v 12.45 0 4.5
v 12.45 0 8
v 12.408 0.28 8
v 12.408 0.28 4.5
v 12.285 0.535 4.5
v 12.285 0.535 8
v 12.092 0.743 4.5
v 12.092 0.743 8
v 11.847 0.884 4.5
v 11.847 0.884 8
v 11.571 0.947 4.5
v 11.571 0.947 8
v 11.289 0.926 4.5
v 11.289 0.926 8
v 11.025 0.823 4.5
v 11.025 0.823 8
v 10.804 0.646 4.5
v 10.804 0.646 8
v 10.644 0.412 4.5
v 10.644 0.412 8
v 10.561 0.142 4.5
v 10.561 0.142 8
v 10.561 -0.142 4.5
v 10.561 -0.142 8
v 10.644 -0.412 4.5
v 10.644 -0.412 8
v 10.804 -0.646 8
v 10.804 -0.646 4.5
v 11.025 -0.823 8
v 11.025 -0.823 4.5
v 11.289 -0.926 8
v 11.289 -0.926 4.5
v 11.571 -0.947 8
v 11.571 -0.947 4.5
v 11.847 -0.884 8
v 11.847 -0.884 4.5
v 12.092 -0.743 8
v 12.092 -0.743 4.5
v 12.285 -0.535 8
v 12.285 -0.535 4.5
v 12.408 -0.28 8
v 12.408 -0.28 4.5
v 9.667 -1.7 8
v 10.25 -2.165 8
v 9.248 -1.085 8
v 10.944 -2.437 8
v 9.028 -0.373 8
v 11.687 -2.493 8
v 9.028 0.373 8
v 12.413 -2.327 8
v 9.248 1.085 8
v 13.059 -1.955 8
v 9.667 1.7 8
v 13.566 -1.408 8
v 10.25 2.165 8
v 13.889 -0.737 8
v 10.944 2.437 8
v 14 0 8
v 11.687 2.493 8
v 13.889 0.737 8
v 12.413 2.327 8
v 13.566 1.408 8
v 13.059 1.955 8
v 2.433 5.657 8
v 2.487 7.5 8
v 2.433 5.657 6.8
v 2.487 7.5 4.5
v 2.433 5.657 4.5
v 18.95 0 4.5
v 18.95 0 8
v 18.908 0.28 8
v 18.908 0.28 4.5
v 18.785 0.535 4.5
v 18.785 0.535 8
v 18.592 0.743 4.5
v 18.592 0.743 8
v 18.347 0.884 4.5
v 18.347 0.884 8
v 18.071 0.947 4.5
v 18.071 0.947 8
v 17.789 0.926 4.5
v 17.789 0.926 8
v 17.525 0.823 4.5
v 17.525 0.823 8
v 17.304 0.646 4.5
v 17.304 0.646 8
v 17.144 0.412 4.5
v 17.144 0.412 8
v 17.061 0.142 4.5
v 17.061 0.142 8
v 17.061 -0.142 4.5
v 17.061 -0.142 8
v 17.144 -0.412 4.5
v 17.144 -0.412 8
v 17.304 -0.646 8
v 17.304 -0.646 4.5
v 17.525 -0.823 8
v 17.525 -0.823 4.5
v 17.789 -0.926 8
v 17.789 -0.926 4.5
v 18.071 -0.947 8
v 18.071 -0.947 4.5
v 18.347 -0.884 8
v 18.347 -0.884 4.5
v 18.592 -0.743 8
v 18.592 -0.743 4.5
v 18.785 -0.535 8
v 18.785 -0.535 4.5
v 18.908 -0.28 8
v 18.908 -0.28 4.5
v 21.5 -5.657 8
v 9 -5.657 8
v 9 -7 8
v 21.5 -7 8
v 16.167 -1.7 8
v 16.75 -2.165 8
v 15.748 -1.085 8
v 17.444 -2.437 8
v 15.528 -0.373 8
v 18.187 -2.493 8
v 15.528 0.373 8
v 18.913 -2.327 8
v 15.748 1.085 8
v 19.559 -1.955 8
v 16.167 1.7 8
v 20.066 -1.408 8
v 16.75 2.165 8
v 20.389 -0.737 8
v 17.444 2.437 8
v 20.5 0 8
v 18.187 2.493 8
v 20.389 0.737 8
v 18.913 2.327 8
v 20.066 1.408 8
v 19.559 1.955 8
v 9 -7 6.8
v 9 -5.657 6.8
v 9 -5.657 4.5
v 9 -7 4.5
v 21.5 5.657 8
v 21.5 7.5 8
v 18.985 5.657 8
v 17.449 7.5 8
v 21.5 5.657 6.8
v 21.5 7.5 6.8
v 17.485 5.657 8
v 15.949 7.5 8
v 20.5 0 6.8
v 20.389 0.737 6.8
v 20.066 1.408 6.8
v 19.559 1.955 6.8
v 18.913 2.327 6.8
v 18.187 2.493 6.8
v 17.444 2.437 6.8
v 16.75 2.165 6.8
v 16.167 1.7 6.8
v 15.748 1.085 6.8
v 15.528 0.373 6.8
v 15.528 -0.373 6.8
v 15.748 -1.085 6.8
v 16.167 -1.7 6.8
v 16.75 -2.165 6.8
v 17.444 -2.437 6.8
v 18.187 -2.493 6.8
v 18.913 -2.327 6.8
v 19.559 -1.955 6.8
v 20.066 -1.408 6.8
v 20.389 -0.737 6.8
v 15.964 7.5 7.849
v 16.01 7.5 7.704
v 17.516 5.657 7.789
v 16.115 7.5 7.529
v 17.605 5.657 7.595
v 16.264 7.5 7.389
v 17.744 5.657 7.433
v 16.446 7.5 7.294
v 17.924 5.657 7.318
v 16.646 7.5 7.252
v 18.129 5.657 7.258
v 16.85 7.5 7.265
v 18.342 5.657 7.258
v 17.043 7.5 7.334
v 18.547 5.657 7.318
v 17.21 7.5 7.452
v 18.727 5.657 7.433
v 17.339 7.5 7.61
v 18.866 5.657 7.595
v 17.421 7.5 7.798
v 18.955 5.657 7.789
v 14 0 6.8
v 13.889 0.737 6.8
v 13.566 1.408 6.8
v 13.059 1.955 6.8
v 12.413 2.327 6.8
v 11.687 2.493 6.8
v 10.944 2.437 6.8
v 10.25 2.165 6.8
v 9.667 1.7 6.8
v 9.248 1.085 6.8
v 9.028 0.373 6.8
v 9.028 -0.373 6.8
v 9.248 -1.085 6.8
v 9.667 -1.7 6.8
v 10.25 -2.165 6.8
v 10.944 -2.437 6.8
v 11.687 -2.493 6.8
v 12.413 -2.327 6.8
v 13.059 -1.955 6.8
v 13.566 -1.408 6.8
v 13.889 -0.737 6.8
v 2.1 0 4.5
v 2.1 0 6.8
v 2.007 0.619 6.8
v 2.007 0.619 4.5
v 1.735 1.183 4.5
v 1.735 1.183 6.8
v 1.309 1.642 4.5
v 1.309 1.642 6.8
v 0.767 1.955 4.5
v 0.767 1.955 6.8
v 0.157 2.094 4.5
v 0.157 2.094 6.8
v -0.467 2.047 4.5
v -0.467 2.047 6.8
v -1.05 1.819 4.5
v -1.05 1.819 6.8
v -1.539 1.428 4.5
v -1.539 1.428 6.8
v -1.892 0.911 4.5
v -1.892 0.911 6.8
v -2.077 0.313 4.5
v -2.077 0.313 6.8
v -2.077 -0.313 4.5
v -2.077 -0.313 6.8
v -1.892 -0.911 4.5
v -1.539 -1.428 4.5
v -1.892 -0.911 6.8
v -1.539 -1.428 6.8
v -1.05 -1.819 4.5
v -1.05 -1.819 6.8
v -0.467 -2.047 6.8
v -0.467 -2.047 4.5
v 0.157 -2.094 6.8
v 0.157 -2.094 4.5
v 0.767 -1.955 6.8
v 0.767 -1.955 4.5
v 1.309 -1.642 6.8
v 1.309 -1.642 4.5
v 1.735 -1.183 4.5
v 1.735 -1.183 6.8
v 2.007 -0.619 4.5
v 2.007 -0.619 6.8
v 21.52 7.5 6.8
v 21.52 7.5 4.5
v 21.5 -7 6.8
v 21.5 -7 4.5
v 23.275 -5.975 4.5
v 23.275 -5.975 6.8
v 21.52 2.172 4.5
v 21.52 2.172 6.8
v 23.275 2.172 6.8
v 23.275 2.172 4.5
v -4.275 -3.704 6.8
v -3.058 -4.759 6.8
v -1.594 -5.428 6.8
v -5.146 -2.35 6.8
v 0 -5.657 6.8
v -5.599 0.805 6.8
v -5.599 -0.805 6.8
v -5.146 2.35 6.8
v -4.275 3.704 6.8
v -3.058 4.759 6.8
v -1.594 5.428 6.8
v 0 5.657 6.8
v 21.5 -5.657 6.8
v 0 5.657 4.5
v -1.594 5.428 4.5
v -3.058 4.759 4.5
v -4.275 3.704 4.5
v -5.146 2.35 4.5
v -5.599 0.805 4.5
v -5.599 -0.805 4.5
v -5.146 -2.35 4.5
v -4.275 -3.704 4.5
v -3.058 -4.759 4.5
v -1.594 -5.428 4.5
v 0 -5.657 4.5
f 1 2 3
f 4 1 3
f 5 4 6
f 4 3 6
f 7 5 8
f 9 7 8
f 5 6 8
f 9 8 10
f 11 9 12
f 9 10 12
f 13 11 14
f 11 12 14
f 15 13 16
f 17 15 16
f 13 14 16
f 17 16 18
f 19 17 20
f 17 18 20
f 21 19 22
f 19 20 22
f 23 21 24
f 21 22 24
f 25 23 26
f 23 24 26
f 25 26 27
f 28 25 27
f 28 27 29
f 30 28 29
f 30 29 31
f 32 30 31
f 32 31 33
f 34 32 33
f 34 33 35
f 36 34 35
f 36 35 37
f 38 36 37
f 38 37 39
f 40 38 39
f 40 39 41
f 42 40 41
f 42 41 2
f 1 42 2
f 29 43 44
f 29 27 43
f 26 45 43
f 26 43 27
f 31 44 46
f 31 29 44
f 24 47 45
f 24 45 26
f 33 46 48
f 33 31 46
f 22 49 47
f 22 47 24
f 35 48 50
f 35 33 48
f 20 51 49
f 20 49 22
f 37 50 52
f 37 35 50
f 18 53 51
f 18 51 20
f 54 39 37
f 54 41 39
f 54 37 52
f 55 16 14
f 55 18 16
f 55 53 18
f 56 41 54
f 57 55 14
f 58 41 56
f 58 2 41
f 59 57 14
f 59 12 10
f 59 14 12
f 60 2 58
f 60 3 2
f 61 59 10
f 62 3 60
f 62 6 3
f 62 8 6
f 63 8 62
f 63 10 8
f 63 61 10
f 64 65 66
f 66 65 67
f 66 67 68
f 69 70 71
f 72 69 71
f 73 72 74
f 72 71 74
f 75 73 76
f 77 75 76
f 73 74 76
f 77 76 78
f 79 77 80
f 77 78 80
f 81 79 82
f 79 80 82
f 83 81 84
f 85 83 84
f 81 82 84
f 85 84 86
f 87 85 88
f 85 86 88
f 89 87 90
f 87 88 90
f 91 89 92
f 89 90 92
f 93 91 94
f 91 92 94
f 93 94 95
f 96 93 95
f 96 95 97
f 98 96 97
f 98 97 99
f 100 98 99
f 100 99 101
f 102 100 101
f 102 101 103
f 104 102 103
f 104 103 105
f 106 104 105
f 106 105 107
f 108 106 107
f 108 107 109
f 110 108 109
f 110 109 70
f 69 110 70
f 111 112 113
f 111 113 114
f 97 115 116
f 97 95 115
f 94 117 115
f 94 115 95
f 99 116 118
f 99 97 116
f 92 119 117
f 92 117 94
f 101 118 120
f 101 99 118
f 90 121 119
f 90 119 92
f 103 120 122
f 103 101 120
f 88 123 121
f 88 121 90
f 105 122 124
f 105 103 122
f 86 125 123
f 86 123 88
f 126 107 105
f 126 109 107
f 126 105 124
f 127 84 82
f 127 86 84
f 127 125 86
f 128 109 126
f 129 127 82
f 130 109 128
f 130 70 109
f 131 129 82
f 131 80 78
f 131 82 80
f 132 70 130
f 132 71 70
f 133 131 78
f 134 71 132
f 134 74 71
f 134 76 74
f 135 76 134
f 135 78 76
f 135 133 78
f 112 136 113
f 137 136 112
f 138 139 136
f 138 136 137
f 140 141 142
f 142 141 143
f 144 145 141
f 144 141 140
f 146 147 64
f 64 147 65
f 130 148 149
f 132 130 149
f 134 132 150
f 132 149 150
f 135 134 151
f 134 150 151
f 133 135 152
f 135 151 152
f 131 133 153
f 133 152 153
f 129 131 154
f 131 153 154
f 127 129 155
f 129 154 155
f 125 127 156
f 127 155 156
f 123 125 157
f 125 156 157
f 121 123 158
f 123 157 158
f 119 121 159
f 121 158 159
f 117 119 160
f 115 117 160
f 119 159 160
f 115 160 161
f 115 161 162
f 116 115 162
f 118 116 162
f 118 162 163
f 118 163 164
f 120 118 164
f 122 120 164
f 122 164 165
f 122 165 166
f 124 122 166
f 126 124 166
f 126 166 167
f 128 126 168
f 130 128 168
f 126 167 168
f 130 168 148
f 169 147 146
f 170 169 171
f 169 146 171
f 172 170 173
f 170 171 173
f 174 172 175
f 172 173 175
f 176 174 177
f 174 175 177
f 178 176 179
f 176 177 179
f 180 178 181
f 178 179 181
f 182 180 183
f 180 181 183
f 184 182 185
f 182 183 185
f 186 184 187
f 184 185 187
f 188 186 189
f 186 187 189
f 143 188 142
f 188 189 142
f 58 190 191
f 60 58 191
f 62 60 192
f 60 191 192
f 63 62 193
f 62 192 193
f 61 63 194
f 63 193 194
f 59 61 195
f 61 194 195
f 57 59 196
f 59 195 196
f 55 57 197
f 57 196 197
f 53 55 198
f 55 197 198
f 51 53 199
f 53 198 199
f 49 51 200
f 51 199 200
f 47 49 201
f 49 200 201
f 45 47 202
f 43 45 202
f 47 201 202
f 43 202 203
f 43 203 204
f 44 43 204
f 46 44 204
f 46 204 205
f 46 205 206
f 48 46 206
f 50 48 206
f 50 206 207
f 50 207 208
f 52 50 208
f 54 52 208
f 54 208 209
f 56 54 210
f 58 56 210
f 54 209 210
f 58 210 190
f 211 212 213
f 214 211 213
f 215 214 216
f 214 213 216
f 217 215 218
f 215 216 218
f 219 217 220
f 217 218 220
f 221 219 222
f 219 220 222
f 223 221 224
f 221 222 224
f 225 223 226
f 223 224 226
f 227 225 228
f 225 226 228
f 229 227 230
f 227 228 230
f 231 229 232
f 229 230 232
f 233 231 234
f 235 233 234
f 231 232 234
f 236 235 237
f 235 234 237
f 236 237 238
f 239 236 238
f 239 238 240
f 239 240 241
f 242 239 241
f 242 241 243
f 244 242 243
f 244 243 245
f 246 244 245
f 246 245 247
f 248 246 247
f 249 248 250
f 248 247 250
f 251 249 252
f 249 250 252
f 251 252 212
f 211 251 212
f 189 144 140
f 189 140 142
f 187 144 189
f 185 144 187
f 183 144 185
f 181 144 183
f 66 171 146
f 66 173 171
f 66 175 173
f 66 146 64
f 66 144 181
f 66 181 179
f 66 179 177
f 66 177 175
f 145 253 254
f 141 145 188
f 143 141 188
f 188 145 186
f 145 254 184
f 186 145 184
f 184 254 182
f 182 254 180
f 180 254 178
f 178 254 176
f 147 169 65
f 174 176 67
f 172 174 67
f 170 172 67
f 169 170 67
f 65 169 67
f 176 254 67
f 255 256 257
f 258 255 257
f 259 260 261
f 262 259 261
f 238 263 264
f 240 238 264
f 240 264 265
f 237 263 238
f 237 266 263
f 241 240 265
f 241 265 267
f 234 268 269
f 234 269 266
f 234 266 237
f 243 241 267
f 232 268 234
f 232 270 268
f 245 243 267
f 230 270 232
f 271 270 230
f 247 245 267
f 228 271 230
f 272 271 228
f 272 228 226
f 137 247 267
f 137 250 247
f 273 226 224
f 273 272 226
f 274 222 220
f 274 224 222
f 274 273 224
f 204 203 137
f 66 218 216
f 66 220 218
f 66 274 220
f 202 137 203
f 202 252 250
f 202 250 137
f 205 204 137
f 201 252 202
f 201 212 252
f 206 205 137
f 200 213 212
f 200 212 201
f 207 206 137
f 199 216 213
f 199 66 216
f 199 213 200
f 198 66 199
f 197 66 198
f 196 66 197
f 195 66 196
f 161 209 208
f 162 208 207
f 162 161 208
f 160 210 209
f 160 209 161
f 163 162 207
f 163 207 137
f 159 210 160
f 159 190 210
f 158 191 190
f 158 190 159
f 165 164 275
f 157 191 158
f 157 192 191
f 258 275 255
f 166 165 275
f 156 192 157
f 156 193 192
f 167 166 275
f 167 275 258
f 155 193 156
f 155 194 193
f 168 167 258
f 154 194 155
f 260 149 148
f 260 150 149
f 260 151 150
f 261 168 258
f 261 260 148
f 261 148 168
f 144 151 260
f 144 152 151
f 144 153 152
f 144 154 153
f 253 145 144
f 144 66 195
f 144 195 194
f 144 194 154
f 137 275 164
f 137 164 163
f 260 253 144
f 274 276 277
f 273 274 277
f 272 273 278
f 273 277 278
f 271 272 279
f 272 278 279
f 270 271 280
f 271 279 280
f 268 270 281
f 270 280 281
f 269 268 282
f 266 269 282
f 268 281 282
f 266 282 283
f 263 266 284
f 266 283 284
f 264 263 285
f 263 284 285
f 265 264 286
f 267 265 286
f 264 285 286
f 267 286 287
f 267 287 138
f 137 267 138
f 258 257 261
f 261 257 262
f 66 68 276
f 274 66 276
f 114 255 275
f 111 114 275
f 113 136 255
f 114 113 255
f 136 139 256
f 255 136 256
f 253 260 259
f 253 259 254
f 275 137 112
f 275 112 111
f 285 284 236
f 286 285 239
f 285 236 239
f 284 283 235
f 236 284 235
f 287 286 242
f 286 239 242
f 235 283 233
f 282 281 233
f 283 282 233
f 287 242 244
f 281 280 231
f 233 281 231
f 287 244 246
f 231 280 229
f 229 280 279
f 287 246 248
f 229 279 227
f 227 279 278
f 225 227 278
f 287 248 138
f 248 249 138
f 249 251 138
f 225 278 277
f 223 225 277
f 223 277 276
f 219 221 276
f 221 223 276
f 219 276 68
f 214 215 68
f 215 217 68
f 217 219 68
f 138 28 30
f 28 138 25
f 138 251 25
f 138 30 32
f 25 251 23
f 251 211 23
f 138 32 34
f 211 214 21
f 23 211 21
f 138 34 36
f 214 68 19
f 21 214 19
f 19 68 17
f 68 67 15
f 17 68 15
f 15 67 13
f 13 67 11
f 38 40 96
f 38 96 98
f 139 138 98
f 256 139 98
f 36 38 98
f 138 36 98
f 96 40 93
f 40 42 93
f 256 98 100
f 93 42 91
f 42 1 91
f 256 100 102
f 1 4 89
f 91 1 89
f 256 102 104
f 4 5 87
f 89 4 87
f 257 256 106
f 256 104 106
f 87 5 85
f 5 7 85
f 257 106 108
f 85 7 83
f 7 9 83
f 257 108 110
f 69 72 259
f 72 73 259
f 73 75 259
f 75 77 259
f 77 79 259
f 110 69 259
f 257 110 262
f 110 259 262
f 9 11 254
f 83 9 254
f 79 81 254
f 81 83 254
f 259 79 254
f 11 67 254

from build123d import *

# Parameters (mm, degrees)
BOSS_EXTRUDE1_DEPTH  = 2
BOSS_EXTRUDE6_DEPTH  = 2.5
CUT_EXTRUDE6_DEPTH   = 2.5
BOSS_EXTRUDE14_DEPTH = 2.3
SKETCH32_R           = 2.1
CUT_EXTRUDE7_DEPTH   = 2.3
SKETCH33_W           = 12.5
SKETCH33_H           = 1.343145751
BOSS_EXTRUDE15_DEPTH = 1.2
SKETCH35_W           = 5.479645997
SKETCH35_H           = 5.327993755
CUT_EXTRUDE8_DEPTH   = 2.4
SKETCH36_W           = 3.7
SKETCH36_H           = 1.827993755
CUT_EXTRUDE9_DEPTH   = 2.4
SKETCH37_R           = 3.9
BOSS_EXTRUDE16_DEPTH = 2.3
CUT_EXTRUDE10_DEPTH  = 5.3
SKETCH43_R           = 2.5
BOSS_EXTRUDE17_DEPTH = 1.2
SKETCH44_R           = 0.95
CUT_EXTRUDE11_DEPTH  = 9
SKETCH45_R           = 2
CUT_EXTRUDE12_DEPTH  = 2.5
SKETCH52_R           = 0.75
CUT_EXTRUDE13_DEPTH  = 10


with BuildPart() as part:
    # Sketch3 → Boss-Extrude1 (new body)
    with BuildSketch(Plane.XY):
        with BuildLine():
            Line((8, 0), (9, -2.5))
            Line((9, -2.5), (9, -7))
            Line((9, -7), (21.5, -7))
            Line((21.5, -7), (25.050252532, -4.949747468))
            ThreePointArc((25.050252532, -4.949747468), (36.467156728, -2.678784027), (30, 7))
            Line((30, 7), (27, 7.5))
            Line((27, 7.5), (5.656854249, 7.5))
            Line((5.656854249, 7.5), (5.656854249, 5.656854249))
            ThreePointArc((5.656854249, 5.656854249), (7.39103626, 3.061467459), (8, 0))
        make_face()
    extrude(amount=BOSS_EXTRUDE1_DEPTH)

    # Sketch22 → Boss-Extrude6 (add)
    with BuildSketch(Plane.XY.offset(2)):
        with BuildLine():
            Line((5.656854249, 5.656854249), (2.486790148, 5.656854249))
            Line((2.486790148, 5.656854249), (2.486790148, 7.5))
            Line((2.486790148, 7.5), (5.656854249, 7.5))
            Line((5.656854249, 7.5), (21.5, 7.5))
            Line((21.5, 7.5), (27, 7.5))
            Line((27, 7.5), (27, 2.172006245))
            Line((27, 2.172006245), (23.275126266, 2.172006245))
            Line((23.275126266, 2.172006245), (23.275126266, -5.974873734))
            Line((23.275126266, -5.974873734), (21.5, -7))
            Line((21.5, -7), (9, -7))
            Line((9, -7), (9, -2.5))
            Line((9, -2.5), (8, 0))
            ThreePointArc((8, 0), (7.39103626, 3.061467459), (5.656854249, 5.656854249))
        make_face()
    extrude(amount=BOSS_EXTRUDE6_DEPTH)

    # Sketch26 → Cut-Extrude6 (cut)
    with BuildSketch(Plane.XY.offset(2)):
        Polygon((18.098080448, 5.3), (2.530052458, 5.3), (2.530052458, 4), (18.098080448, 4), (27, 4), (27, 5.3), align=None)
    extrude(amount=CUT_EXTRUDE6_DEPTH, mode=Mode.SUBTRACT)


with BuildPart() as body_2:
    # Sketch31 → Boss-Extrude14 (new body)
    with BuildSketch(Plane.XY.offset(4.5)):
        with BuildLine():
            Line((2.432688066, 5.656854249), (0, 5.656854249))
            ThreePointArc((0, 5.656854249), (-5.656854249, 0), (0, -5.656854249))
            Line((0, -5.656854249), (9, -5.656854249))
            Line((9, -5.656854249), (9, -7))
            Line((9, -7), (21.5, -7))
            Line((21.5, -7), (23.275126266, -5.974873734))
            Line((23.275126266, -5.974873734), (23.275126266, 2.172006245))
            Line((23.275126266, 2.172006245), (27, 2.172006245))
            Line((27, 2.172006245), (27, 7.5))
            Line((27, 7.5), (2.486790148, 7.5))
            Line((2.486790148, 7.5), (2.432688066, 5.656854249))
        make_face()
    extrude(amount=BOSS_EXTRUDE14_DEPTH)

    # Sketch32 → Cut-Extrude7 (cut)
    with BuildSketch(Plane.XY.offset(6.8)):
        Circle(SKETCH32_R)
    extrude(amount=-CUT_EXTRUDE7_DEPTH, mode=Mode.SUBTRACT)

    # Sketch33 → Boss-Extrude15 (add)
    with BuildSketch(Plane.XY.offset(6.8)):
        with Locations((15.25, -6.328427125)):
            Rectangle(SKETCH33_W, SKETCH33_H)
        Polygon((2.486790148, 7.5), (21.5, 7.5), (21.5, 5.656854249), (2.432688066, 5.656854249), align=None)
    extrude(amount=BOSS_EXTRUDE15_DEPTH)


with BuildPart() as cut_extrude8_tool:
    # Sketch35 → Cut-Extrude8 (new body)
    with BuildSketch(Plane.XY.offset(6.8)):
        with Locations((24.260177002, 4.836003123)):
            Rectangle(SKETCH35_W, SKETCH35_H)
    extrude(amount=-CUT_EXTRUDE8_DEPTH)


with BuildPart() as part_1:
    add(part.part)

    # Cut-Extrude8: cut by cut_extrude8_tool
    add(cut_extrude8_tool.part, mode=Mode.SUBTRACT)

    # Sketch36 → Cut-Extrude9 (cut)
    with BuildSketch(Plane.XY.offset(4.4)):
        with Locations((25.15, 3.086003123)):
            Rectangle(SKETCH36_W, SKETCH36_H)
    extrude(amount=-CUT_EXTRUDE9_DEPTH, mode=Mode.SUBTRACT)

    # Sketch37 → Boss-Extrude16 (add)
    with BuildSketch(Plane.XY.offset(2)):
        with Locations((30, 0)):
            Circle(SKETCH37_R)
    extrude(amount=BOSS_EXTRUDE16_DEPTH)

    # Sketch39 → Cut-Extrude10 (cut, through all)
    with BuildSketch(Plane.XY.offset(4.3)):
        with BuildLine():
            Line((29, 1.732050808), (29, -1.732050808))
            ThreePointArc((29, -1.732050808), (32, 0), (29, 1.732050808))
        make_face()
    extrude(amount=-CUT_EXTRUDE10_DEPTH, mode=Mode.SUBTRACT)


with BuildPart() as body_2_1:
    add(body_2.part)

    # Cut-Extrude8: cut by cut_extrude8_tool
    add(cut_extrude8_tool.part, mode=Mode.SUBTRACT)

    # Sketch43 → Boss-Extrude17 (add)
    with BuildSketch(Plane.XY.offset(6.8)):
        with Locations((11.5, 0)):
            Circle(SKETCH43_R)
        with Locations((18, 0)):
            Circle(SKETCH43_R)
    extrude(amount=BOSS_EXTRUDE17_DEPTH)


with BuildPart() as cut_extrude11_tool:
    # Sketch44 → Cut-Extrude11 (new body, through all)
    with BuildSketch(Plane.XY.offset(8)):
        with Locations((11.5, 0)):
            Circle(SKETCH44_R)
        with Locations((18, 0)):
            Circle(SKETCH44_R)
    extrude(amount=-CUT_EXTRUDE11_DEPTH)


with BuildPart() as part_2:
    add(part_1.part)

    # Cut-Extrude11: cut by cut_extrude11_tool
    add(cut_extrude11_tool.part, mode=Mode.SUBTRACT)

    # Sketch45 → Cut-Extrude12 (cut)
    with BuildSketch(Plane(origin=(0, 0, 0), x_dir=(-1, 0, 0), z_dir=(0, 0, -1))):
        with Locations((-11.5, 0)):
            Circle(SKETCH45_R)
        with Locations((-18, 0)):
            Circle(SKETCH45_R)
    extrude(amount=-CUT_EXTRUDE12_DEPTH, mode=Mode.SUBTRACT)


with BuildPart() as body_2_2:
    add(body_2_1.part)

    # Cut-Extrude11: cut by cut_extrude11_tool
    add(cut_extrude11_tool.part, mode=Mode.SUBTRACT)

    # Sketch52 → Cut-Extrude13 (cut, along a direction that is not the sketch's normal)
    with BuildSketch(Plane.XZ.offset(-5.656854249)):
        with Locations((18.235476819, 8)):
            Circle(SKETCH52_R)
    extrude(amount=-CUT_EXTRUDE13_DEPTH, dir=(0.640410196, -0.76803306, 0), mode=Mode.SUBTRACT)


solid = body_2_2.part
